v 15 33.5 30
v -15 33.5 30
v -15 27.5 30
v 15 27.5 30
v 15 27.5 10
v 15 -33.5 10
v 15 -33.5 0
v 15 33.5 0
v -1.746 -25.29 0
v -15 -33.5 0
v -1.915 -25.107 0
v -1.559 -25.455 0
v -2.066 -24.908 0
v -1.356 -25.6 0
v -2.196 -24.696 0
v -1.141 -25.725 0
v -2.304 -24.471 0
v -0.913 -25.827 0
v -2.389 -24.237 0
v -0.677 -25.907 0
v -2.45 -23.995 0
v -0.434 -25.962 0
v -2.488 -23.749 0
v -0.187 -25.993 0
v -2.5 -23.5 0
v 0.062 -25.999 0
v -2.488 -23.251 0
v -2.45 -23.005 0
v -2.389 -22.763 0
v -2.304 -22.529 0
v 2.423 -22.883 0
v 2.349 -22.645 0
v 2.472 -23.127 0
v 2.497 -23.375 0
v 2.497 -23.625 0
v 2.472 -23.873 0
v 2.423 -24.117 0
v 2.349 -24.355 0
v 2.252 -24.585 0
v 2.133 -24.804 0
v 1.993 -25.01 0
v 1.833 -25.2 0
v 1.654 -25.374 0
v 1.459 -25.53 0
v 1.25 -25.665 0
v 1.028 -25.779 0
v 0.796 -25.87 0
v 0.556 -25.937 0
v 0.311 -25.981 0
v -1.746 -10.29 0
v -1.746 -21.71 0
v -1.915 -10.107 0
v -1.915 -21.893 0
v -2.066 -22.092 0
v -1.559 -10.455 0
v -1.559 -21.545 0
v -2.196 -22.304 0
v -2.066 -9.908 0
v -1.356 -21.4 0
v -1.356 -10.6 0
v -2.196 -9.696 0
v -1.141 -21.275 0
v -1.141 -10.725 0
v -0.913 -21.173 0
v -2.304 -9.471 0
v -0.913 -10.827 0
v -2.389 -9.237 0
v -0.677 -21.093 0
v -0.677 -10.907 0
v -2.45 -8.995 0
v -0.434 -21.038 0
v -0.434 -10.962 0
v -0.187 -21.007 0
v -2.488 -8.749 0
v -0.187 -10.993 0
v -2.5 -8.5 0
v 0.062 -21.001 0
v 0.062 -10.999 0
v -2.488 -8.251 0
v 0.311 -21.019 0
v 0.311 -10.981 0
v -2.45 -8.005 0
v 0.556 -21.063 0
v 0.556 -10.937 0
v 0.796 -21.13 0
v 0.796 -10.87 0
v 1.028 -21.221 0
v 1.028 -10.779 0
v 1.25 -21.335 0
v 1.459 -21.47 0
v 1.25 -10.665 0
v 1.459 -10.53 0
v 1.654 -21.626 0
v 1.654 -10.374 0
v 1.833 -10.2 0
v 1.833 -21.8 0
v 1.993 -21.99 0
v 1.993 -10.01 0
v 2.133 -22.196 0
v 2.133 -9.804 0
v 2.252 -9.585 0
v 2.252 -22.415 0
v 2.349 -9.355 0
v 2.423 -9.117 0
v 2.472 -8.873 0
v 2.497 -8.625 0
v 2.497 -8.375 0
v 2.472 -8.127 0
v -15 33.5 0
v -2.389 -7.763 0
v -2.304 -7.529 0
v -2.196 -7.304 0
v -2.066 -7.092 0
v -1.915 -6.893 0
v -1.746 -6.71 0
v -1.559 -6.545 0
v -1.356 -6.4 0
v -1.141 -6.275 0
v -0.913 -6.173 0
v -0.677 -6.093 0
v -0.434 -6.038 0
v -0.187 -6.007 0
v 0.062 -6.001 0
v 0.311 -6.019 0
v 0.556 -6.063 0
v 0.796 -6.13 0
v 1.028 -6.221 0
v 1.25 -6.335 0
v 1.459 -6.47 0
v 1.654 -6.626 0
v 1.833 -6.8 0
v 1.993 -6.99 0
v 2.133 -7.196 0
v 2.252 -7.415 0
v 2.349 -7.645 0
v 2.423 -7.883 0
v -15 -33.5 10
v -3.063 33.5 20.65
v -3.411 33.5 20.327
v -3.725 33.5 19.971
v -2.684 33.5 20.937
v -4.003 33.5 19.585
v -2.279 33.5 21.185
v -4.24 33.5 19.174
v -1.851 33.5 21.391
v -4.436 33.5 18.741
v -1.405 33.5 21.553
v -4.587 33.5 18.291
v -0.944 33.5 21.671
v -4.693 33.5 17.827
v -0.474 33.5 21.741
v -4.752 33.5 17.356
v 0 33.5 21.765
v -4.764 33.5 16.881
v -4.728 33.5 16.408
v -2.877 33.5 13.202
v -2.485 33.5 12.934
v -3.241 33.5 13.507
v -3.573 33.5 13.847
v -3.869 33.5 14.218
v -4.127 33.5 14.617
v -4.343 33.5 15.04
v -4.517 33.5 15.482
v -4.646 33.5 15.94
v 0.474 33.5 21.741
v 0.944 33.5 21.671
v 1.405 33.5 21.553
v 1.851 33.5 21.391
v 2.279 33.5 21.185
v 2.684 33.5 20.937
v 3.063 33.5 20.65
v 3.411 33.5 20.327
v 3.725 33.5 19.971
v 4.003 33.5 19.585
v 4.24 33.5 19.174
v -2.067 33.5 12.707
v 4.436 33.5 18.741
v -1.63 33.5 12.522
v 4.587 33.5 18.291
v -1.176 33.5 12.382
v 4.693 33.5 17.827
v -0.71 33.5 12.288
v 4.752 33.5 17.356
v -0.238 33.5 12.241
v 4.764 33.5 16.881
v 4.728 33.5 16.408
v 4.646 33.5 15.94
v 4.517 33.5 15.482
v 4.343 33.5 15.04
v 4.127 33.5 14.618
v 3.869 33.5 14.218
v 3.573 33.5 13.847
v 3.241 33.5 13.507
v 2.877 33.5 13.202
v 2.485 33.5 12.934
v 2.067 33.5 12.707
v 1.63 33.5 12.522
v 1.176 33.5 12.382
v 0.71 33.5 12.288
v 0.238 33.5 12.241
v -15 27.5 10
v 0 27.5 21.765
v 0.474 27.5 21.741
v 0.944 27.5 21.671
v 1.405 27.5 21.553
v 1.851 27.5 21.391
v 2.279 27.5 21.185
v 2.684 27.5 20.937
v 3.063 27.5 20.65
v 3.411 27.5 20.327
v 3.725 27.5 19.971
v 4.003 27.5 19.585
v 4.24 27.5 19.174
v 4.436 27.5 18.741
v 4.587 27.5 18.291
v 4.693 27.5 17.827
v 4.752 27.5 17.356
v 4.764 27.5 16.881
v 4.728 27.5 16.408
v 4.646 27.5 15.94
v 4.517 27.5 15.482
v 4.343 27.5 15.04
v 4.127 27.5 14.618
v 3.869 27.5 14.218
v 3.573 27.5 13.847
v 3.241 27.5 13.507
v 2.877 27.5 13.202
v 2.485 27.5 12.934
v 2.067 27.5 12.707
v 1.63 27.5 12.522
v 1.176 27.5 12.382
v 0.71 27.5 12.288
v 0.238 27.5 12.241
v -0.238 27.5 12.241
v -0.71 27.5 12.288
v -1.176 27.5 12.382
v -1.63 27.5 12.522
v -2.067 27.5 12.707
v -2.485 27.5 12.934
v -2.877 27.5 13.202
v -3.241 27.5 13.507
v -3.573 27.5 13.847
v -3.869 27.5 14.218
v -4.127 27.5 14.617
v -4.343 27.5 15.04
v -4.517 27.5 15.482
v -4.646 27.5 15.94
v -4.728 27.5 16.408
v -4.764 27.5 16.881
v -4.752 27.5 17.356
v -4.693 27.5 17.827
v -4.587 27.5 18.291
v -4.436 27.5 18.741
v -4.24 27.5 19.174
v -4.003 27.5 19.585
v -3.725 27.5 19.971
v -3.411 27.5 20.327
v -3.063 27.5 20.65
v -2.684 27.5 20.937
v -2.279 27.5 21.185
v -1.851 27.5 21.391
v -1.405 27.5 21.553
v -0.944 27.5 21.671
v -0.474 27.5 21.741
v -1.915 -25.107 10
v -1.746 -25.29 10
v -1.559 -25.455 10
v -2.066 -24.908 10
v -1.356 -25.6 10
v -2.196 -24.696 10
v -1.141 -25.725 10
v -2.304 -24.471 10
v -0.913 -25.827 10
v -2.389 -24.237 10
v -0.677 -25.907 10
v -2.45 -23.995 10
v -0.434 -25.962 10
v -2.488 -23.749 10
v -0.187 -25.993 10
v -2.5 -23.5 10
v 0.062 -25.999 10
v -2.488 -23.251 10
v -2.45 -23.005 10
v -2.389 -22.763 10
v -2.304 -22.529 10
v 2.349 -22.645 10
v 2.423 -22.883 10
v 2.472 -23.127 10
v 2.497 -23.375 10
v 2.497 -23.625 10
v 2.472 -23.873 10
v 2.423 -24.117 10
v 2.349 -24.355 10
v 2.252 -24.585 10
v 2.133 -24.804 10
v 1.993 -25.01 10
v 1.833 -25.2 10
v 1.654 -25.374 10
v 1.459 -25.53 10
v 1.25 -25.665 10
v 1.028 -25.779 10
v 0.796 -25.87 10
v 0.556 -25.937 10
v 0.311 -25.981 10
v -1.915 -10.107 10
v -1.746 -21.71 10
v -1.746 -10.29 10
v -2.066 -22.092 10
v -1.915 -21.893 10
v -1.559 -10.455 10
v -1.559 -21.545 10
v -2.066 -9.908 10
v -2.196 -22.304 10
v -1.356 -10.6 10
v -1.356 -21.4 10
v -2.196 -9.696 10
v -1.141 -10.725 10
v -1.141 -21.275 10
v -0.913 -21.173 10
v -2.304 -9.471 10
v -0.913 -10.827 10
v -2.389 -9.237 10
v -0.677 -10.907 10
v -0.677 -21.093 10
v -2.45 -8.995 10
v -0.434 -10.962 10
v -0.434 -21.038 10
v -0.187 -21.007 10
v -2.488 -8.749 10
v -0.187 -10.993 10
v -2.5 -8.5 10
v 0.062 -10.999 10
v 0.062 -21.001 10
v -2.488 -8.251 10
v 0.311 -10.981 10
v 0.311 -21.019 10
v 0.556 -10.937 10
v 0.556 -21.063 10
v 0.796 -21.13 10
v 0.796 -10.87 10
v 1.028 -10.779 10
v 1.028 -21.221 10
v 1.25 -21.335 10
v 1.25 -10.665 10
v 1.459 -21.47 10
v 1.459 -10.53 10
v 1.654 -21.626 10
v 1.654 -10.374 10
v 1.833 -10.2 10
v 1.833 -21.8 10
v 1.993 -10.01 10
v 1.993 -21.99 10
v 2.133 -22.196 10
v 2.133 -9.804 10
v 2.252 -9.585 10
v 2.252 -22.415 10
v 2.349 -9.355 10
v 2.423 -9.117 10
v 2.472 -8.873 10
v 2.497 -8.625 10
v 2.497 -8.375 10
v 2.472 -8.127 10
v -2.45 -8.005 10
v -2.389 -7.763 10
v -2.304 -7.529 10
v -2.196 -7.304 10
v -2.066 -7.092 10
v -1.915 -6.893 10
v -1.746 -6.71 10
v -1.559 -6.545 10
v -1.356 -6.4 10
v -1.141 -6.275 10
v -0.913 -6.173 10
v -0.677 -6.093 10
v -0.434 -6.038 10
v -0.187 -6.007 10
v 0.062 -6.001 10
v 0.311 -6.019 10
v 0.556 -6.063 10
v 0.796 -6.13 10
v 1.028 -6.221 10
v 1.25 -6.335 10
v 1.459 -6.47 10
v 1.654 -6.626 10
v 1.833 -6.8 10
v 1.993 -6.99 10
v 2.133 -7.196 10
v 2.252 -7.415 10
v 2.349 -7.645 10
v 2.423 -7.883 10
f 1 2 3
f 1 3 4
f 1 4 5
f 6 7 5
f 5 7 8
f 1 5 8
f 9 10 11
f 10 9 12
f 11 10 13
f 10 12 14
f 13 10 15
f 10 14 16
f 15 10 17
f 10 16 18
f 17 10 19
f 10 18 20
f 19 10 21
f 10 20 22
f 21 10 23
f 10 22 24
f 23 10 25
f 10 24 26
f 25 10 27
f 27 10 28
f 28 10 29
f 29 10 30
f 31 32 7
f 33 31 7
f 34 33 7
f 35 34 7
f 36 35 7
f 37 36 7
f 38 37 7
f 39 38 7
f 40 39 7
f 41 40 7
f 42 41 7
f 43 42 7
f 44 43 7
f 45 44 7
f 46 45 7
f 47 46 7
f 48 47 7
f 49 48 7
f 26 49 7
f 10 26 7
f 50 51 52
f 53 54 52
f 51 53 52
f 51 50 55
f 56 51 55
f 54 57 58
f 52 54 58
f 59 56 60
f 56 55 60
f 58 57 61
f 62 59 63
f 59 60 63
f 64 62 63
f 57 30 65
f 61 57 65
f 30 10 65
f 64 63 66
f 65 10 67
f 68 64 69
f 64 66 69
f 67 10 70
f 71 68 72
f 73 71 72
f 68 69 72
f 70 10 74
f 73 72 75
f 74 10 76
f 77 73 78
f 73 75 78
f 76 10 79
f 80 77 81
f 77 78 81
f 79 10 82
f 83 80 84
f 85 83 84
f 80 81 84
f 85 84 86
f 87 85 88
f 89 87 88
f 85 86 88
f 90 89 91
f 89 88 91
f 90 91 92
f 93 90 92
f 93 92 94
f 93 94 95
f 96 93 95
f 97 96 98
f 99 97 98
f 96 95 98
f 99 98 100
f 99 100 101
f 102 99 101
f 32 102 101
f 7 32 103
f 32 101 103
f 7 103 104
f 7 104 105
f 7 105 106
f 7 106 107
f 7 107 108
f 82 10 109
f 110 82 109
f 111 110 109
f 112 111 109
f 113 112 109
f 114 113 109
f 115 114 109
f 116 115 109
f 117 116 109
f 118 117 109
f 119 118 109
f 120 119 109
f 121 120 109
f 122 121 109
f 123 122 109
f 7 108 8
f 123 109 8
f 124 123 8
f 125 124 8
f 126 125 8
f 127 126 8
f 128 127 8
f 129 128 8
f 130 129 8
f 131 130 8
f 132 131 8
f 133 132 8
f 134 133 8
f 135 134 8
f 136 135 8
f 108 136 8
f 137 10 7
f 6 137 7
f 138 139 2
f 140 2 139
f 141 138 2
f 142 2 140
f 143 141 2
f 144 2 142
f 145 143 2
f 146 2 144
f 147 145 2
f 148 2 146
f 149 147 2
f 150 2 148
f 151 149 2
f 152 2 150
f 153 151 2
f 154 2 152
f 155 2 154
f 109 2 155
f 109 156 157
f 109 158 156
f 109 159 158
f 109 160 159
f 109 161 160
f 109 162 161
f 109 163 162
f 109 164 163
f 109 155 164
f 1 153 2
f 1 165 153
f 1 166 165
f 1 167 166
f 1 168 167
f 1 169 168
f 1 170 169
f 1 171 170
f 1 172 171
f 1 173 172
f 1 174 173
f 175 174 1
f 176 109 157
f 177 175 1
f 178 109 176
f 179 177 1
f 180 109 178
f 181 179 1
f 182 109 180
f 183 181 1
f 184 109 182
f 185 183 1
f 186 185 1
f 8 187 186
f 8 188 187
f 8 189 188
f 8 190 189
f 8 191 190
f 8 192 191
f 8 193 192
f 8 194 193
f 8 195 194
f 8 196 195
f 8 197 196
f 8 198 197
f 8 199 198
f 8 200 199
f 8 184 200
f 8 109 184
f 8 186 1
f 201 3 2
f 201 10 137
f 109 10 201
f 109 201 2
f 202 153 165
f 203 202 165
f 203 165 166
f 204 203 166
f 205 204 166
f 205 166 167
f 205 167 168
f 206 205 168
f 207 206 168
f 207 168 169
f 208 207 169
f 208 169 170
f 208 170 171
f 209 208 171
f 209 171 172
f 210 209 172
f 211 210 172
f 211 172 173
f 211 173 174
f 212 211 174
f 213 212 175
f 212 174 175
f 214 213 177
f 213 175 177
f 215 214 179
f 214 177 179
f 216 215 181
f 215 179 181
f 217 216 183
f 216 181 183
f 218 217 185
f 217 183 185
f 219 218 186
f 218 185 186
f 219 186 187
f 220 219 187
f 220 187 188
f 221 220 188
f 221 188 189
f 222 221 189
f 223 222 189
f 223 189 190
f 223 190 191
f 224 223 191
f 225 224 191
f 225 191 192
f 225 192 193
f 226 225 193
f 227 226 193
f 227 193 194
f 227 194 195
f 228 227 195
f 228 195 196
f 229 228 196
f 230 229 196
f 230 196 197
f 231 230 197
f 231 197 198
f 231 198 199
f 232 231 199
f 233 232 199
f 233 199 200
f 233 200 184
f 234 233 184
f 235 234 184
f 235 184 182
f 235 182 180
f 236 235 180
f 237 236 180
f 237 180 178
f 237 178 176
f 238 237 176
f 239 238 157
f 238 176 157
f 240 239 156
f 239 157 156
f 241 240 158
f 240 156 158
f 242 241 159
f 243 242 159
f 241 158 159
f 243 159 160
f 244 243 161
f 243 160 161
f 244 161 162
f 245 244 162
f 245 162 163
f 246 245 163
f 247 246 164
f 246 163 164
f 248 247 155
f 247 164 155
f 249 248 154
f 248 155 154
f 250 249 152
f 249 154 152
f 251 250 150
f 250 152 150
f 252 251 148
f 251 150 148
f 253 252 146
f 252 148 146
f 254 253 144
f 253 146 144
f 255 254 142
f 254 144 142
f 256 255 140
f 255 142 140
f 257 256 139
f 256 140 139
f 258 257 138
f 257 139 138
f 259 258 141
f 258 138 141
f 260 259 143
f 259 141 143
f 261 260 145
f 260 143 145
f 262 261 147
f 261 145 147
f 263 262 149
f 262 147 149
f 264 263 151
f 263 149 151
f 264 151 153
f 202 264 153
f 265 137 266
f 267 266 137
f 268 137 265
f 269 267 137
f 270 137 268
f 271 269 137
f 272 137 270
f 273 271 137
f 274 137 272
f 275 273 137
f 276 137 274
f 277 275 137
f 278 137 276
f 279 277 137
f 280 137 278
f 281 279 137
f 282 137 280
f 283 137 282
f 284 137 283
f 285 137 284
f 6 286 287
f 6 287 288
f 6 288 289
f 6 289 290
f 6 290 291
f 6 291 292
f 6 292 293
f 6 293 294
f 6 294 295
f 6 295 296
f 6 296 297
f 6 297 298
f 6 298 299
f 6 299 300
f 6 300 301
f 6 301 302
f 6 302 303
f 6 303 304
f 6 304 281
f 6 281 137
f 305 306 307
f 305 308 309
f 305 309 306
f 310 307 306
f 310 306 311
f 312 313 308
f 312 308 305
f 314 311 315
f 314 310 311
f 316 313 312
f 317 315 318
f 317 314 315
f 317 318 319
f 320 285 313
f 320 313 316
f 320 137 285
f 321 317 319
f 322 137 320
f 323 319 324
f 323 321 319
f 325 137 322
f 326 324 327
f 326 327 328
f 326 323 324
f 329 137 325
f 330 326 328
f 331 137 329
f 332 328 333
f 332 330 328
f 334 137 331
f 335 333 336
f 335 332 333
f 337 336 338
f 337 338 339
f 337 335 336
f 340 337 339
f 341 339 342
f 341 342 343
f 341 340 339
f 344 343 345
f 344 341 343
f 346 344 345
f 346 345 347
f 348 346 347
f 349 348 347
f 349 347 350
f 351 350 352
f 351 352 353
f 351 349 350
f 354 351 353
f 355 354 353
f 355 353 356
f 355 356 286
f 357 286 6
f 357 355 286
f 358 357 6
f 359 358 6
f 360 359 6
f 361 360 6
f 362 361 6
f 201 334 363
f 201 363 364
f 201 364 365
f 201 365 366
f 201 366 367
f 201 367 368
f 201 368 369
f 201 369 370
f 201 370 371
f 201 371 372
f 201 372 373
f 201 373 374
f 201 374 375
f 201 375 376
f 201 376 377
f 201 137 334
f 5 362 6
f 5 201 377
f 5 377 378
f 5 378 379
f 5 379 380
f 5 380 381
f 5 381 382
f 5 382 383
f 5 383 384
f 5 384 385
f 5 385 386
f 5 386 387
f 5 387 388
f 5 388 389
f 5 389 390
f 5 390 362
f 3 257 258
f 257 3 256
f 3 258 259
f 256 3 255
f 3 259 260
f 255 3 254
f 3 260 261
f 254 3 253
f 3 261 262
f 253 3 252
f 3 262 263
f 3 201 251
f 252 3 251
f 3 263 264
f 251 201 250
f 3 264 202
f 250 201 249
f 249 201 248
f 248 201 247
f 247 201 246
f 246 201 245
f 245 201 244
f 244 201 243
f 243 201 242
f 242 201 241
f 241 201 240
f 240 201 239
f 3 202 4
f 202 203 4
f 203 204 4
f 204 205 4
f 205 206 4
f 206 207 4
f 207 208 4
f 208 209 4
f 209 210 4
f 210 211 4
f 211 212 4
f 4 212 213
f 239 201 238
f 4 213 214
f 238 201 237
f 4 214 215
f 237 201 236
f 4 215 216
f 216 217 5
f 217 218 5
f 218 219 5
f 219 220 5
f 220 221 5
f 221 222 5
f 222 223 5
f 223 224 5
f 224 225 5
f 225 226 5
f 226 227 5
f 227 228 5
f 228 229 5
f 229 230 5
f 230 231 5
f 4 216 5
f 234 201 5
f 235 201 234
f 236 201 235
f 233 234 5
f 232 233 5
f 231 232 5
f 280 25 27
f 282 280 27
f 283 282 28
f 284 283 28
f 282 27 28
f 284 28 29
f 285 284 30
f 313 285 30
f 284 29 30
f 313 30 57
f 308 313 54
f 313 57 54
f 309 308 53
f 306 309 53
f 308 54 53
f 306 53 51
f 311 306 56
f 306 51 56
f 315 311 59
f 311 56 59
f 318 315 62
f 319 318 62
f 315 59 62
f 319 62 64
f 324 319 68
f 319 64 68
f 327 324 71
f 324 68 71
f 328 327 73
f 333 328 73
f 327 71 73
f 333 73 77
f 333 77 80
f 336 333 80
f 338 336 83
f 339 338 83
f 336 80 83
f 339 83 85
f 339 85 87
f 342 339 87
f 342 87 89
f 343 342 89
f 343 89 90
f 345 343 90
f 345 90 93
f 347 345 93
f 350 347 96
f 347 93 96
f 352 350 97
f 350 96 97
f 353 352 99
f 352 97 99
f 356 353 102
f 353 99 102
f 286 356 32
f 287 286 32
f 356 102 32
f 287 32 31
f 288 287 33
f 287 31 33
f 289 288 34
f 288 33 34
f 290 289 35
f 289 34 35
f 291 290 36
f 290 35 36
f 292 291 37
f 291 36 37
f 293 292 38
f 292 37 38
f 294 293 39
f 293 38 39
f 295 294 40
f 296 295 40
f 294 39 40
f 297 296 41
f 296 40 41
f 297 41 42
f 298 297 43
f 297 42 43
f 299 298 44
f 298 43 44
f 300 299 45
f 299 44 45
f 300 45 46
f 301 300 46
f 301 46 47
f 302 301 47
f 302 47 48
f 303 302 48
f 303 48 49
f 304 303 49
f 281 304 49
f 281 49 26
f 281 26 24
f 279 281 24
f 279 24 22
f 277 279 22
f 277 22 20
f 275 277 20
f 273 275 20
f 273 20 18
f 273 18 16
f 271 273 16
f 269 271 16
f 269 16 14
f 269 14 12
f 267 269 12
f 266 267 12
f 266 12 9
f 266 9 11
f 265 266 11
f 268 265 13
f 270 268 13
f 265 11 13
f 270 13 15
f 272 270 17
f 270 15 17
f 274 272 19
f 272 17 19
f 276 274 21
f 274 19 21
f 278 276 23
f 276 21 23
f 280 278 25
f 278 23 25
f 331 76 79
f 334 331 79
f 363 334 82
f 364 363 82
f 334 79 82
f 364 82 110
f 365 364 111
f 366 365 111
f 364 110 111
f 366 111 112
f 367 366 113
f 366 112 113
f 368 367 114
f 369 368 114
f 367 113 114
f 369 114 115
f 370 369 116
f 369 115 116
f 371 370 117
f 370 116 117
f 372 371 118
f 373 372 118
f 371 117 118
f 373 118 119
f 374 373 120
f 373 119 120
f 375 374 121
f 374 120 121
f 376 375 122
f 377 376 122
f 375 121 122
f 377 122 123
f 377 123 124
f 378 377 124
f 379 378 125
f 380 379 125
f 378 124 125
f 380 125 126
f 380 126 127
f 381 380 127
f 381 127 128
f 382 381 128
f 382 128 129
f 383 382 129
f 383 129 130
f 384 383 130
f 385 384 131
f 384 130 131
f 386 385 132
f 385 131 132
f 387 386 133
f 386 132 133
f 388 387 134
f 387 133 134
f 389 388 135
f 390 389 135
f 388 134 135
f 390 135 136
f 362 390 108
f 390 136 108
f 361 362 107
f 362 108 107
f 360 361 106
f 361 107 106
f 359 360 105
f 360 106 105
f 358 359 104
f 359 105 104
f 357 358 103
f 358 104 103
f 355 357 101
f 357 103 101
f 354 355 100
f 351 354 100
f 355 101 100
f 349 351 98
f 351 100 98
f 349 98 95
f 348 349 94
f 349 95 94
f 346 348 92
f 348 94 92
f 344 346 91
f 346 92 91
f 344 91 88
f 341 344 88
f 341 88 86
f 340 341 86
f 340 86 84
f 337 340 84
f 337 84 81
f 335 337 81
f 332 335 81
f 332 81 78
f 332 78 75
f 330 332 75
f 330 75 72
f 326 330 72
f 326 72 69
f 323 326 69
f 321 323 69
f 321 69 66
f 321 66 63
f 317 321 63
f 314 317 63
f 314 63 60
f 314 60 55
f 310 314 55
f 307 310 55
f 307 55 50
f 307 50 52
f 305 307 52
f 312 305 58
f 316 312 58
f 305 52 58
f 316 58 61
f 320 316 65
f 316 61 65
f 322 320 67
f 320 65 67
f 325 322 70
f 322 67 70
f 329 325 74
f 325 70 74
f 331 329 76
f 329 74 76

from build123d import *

# Parameters (mm, degrees)
ESBO_O1_W                = 30
ESBO_O1_H                = 67
RESSALTO_EXTRUS_O1_DEPTH = 10
ESBO_O2_W                = 30
ESBO_O2_H                = 6
RESSALTO_EXTRUS_O2_DEPTH = 20
CORTE_EXTRUS_O1_REACH    = 76.927
ESBO_O3_R                = 4.765
ESBO_O4_R                = 2.5
CORTE_EXTRUS_O2_DEPTH    = 10


with BuildPart() as part:
    # Esboço1 → Ressalto-extrusão1 (new body)
    with BuildSketch(Plane.XY):
        Rectangle(ESBO_O1_W, ESBO_O1_H)
    extrude(amount=RESSALTO_EXTRUS_O1_DEPTH)

    # Esboço2 → Ressalto-extrusão2 (add)
    with BuildSketch(Plane.XY.offset(10)):
        with Locations((0, 30.5)):
            Rectangle(ESBO_O2_W, ESBO_O2_H)
    extrude(amount=RESSALTO_EXTRUS_O2_DEPTH)

    # Esboço3 → Corte-extrusão1 (cut, up to next)
    with BuildSketch(Plane(origin=(0, 33.5, 0), x_dir=(1, 0, 0), z_dir=(0, 1, 0)), mode=Mode.PRIVATE) as corte_extrus_o1_sk1:
        with Locations(Location((0, -17, 0), (0, 0, 270))):
            Circle(ESBO_O3_R)
    corte_extrus_o1_tool1 = extrude(corte_extrus_o1_sk1.sketch, amount=-CORTE_EXTRUS_O1_REACH, mode=Mode.PRIVATE) & part.part
    add(corte_extrus_o1_tool1.solids().sort_by_distance((0, 33.5, 17))[0], mode=Mode.SUBTRACT)

    # Esboço4 → Corte-extrusão2 (cut)
    with BuildSketch(Plane(origin=(0, 0, 0), x_dir=(-1, 0, 0), z_dir=(0, 0, -1))):
        with Locations((0, -23.5)):
            Circle(ESBO_O4_R)
        with Locations((0, -8.5)):
            Circle(ESBO_O4_R)
    extrude(amount=-CORTE_EXTRUS_O2_DEPTH, mode=Mode.SUBTRACT)


solid = part.part
